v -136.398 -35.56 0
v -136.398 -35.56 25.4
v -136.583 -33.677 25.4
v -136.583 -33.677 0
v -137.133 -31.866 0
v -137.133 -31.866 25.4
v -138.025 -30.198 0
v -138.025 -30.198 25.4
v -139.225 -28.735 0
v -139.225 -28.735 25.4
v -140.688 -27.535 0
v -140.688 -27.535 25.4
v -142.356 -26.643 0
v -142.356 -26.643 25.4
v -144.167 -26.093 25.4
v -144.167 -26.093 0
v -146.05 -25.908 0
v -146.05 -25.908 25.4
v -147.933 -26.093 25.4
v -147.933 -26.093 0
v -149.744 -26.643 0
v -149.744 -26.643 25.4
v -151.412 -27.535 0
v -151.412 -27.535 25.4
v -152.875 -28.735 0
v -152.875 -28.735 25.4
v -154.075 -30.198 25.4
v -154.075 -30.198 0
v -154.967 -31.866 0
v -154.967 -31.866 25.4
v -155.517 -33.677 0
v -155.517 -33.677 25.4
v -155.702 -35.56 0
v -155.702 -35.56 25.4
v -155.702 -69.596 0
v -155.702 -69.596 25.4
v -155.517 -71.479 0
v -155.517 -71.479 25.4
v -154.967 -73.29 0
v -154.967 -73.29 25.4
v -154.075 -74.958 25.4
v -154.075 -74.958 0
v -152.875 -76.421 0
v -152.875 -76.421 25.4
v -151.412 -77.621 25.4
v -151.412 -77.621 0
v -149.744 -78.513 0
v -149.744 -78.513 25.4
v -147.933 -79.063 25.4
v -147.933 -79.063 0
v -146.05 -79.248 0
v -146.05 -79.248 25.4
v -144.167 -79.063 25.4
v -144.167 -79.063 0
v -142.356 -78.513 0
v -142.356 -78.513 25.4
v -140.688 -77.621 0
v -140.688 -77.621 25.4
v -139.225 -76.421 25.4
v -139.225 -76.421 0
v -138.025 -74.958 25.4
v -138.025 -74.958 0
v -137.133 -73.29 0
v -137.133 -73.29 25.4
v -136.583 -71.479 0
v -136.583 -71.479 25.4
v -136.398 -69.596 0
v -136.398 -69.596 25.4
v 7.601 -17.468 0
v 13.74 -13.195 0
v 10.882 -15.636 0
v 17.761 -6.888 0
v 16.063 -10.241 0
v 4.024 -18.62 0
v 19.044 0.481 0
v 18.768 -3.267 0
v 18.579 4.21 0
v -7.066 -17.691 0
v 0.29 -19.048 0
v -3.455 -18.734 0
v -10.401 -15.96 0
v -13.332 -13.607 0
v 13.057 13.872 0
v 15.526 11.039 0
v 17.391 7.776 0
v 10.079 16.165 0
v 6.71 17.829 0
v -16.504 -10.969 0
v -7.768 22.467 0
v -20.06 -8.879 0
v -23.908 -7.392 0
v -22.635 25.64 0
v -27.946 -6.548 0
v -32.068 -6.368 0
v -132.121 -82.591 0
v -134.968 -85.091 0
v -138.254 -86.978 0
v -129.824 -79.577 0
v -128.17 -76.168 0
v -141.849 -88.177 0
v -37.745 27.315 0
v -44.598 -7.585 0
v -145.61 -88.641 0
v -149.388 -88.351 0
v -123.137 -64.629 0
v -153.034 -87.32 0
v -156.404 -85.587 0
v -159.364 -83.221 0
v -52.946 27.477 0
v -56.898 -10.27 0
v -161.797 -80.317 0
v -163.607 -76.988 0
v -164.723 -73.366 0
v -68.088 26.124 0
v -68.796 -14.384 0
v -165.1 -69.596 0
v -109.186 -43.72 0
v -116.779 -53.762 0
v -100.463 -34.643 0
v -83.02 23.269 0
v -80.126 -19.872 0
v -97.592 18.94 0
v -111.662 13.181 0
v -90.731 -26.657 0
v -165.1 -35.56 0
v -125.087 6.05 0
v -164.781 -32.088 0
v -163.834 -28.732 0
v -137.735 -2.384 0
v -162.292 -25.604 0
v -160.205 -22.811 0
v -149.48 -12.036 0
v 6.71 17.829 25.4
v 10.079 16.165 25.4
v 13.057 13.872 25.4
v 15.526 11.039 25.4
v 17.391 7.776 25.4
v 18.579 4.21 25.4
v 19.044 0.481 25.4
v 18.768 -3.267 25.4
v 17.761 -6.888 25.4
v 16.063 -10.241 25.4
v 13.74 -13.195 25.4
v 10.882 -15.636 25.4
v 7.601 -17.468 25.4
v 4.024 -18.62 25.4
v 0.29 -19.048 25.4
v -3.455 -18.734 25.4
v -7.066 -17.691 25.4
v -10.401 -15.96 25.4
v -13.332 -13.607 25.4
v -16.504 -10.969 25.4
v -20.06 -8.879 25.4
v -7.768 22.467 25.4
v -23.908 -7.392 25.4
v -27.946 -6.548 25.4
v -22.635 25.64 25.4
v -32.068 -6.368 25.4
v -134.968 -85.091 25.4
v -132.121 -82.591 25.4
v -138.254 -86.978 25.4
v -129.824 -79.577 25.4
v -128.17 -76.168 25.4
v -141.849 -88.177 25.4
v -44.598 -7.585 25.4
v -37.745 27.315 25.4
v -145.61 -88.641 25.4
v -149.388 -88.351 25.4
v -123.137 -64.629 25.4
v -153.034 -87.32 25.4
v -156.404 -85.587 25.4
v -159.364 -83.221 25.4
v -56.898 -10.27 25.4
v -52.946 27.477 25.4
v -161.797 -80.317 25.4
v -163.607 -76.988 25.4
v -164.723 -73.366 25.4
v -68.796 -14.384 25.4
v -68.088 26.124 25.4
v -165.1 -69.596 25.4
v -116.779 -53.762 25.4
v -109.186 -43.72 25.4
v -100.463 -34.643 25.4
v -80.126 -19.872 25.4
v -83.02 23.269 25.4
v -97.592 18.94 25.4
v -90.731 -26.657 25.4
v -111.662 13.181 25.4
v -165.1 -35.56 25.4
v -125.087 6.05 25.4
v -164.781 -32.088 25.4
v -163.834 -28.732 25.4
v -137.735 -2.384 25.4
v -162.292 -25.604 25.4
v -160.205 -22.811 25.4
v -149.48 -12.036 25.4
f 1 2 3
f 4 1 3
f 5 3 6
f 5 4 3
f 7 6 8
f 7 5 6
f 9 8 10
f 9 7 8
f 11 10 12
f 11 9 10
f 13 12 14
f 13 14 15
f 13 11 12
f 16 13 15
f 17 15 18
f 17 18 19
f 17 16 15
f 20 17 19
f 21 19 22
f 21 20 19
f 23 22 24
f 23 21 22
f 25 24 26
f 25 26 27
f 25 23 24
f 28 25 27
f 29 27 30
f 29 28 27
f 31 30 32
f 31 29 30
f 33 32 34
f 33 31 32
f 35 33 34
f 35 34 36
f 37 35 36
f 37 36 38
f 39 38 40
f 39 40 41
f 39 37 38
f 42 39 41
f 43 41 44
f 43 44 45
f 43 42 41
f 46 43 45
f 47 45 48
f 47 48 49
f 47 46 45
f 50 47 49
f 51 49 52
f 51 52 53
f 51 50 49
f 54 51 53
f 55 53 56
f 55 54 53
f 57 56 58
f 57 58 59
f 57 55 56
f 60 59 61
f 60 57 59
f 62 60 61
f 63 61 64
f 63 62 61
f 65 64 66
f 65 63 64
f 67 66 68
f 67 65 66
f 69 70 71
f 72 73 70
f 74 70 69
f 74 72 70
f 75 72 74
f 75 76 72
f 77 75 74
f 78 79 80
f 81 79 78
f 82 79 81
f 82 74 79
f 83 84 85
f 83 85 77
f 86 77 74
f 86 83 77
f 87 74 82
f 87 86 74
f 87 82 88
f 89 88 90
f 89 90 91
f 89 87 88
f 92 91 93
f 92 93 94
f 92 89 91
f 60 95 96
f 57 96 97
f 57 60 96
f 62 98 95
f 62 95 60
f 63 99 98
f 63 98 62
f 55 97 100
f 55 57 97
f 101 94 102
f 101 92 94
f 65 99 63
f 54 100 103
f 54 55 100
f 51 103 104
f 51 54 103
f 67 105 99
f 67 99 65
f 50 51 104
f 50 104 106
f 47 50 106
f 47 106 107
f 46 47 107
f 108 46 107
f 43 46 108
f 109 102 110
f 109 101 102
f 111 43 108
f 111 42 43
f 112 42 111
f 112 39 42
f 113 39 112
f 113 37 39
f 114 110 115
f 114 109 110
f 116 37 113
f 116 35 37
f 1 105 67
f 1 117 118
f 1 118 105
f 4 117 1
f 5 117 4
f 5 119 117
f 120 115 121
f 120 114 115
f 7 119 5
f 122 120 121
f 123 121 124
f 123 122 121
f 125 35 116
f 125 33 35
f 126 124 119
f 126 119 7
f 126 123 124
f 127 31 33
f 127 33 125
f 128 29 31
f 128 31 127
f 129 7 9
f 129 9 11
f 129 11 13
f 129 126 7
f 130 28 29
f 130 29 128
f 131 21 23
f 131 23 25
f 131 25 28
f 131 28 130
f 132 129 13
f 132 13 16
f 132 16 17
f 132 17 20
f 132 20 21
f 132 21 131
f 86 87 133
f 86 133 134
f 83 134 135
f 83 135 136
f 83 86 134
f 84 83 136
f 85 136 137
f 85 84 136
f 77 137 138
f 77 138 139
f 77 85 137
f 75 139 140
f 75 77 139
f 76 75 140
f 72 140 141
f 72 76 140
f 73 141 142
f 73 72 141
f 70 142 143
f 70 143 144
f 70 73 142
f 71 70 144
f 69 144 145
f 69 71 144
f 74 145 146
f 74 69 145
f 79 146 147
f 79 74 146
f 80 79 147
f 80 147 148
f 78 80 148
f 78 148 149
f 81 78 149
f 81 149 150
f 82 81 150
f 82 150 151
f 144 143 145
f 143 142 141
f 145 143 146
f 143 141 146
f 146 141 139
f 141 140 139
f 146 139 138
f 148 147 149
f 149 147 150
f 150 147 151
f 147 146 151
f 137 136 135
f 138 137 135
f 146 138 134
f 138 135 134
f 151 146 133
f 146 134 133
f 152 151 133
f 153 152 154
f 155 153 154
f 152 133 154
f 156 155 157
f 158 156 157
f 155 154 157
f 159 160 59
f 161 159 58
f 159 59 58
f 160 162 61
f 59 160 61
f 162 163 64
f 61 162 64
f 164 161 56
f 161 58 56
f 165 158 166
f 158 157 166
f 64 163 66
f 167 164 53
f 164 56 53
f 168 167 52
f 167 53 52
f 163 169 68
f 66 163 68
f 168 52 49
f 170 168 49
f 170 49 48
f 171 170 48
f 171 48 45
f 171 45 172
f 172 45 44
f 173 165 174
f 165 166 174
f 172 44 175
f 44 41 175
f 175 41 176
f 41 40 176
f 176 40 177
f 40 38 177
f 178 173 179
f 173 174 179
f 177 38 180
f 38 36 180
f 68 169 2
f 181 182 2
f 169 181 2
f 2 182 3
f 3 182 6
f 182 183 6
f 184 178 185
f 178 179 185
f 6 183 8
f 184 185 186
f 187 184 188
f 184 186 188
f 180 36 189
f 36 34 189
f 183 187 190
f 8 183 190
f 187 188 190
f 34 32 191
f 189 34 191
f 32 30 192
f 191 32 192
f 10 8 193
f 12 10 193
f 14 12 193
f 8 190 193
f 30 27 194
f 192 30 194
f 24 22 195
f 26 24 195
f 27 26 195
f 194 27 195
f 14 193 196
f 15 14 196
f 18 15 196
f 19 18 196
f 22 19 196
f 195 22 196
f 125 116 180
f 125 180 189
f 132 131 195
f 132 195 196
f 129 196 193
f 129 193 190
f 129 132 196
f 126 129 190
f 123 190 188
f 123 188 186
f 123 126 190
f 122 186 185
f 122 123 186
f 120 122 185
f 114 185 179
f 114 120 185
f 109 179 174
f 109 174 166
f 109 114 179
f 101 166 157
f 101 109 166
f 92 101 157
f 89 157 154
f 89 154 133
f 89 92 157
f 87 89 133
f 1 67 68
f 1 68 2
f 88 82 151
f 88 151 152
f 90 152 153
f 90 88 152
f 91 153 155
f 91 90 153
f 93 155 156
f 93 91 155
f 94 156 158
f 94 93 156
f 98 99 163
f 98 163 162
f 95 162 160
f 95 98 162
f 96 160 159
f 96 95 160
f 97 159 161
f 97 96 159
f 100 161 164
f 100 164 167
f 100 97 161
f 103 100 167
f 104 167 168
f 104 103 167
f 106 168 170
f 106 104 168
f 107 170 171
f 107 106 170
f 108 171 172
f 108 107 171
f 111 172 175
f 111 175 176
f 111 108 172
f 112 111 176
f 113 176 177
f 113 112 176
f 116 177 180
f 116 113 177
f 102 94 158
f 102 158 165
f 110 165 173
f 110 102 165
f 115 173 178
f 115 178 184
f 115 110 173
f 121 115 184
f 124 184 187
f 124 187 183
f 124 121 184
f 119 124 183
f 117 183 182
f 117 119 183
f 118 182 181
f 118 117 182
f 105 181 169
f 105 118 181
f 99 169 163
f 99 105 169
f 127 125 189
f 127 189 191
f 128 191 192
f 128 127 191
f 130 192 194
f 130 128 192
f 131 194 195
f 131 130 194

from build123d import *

# Parameters (mm, degrees)
BOSS_EXTRUDE1_DEPTH = 25.4


with BuildPart() as part:
    # Sketch1 → Boss-Extrude1 (new body)
    with BuildSketch(Plane.XY):
        with BuildLine():
            Line((-165.1, -69.596), (-165.1, -35.56))
            ThreePointArc((-165.1, -35.56), (-163.834131861, -28.731592137), (-160.20476074, -22.810676552))
            ThreePointArc((-160.20476074, -22.810676552), (-83.019510627, 23.268882931), (6.709524974, 17.829323448))
            ThreePointArc((6.709524974, 17.829323448), (16.063246399, -10.240830783), (-13.332222743, -13.607142857))
            ThreePointArc((-13.332222743, -13.607142857), (-21.95402191, -8.057064985), (-32.067687872, -6.368116766))
            ThreePointArc((-32.067687872, -6.368116766), (-90.731121166, -26.656656194), (-128.169572983, -76.168125204))
            ThreePointArc((-128.169572983, -76.168125204), (-149.387691218, -88.351327705), (-165.1, -69.596))
        make_face()
        with BuildLine():
            Line((-155.702, -35.56), (-155.702, -69.596))
            ThreePointArc((-155.702, -69.596), (-146.05, -79.248), (-136.398, -69.596))
            Line((-136.398, -69.596), (-136.398, -35.56))
            ThreePointArc((-136.398, -35.56), (-146.05, -25.908), (-155.702, -35.56))
        make_face(mode=Mode.SUBTRACT)
    extrude(amount=BOSS_EXTRUDE1_DEPTH)


solid = part.part
